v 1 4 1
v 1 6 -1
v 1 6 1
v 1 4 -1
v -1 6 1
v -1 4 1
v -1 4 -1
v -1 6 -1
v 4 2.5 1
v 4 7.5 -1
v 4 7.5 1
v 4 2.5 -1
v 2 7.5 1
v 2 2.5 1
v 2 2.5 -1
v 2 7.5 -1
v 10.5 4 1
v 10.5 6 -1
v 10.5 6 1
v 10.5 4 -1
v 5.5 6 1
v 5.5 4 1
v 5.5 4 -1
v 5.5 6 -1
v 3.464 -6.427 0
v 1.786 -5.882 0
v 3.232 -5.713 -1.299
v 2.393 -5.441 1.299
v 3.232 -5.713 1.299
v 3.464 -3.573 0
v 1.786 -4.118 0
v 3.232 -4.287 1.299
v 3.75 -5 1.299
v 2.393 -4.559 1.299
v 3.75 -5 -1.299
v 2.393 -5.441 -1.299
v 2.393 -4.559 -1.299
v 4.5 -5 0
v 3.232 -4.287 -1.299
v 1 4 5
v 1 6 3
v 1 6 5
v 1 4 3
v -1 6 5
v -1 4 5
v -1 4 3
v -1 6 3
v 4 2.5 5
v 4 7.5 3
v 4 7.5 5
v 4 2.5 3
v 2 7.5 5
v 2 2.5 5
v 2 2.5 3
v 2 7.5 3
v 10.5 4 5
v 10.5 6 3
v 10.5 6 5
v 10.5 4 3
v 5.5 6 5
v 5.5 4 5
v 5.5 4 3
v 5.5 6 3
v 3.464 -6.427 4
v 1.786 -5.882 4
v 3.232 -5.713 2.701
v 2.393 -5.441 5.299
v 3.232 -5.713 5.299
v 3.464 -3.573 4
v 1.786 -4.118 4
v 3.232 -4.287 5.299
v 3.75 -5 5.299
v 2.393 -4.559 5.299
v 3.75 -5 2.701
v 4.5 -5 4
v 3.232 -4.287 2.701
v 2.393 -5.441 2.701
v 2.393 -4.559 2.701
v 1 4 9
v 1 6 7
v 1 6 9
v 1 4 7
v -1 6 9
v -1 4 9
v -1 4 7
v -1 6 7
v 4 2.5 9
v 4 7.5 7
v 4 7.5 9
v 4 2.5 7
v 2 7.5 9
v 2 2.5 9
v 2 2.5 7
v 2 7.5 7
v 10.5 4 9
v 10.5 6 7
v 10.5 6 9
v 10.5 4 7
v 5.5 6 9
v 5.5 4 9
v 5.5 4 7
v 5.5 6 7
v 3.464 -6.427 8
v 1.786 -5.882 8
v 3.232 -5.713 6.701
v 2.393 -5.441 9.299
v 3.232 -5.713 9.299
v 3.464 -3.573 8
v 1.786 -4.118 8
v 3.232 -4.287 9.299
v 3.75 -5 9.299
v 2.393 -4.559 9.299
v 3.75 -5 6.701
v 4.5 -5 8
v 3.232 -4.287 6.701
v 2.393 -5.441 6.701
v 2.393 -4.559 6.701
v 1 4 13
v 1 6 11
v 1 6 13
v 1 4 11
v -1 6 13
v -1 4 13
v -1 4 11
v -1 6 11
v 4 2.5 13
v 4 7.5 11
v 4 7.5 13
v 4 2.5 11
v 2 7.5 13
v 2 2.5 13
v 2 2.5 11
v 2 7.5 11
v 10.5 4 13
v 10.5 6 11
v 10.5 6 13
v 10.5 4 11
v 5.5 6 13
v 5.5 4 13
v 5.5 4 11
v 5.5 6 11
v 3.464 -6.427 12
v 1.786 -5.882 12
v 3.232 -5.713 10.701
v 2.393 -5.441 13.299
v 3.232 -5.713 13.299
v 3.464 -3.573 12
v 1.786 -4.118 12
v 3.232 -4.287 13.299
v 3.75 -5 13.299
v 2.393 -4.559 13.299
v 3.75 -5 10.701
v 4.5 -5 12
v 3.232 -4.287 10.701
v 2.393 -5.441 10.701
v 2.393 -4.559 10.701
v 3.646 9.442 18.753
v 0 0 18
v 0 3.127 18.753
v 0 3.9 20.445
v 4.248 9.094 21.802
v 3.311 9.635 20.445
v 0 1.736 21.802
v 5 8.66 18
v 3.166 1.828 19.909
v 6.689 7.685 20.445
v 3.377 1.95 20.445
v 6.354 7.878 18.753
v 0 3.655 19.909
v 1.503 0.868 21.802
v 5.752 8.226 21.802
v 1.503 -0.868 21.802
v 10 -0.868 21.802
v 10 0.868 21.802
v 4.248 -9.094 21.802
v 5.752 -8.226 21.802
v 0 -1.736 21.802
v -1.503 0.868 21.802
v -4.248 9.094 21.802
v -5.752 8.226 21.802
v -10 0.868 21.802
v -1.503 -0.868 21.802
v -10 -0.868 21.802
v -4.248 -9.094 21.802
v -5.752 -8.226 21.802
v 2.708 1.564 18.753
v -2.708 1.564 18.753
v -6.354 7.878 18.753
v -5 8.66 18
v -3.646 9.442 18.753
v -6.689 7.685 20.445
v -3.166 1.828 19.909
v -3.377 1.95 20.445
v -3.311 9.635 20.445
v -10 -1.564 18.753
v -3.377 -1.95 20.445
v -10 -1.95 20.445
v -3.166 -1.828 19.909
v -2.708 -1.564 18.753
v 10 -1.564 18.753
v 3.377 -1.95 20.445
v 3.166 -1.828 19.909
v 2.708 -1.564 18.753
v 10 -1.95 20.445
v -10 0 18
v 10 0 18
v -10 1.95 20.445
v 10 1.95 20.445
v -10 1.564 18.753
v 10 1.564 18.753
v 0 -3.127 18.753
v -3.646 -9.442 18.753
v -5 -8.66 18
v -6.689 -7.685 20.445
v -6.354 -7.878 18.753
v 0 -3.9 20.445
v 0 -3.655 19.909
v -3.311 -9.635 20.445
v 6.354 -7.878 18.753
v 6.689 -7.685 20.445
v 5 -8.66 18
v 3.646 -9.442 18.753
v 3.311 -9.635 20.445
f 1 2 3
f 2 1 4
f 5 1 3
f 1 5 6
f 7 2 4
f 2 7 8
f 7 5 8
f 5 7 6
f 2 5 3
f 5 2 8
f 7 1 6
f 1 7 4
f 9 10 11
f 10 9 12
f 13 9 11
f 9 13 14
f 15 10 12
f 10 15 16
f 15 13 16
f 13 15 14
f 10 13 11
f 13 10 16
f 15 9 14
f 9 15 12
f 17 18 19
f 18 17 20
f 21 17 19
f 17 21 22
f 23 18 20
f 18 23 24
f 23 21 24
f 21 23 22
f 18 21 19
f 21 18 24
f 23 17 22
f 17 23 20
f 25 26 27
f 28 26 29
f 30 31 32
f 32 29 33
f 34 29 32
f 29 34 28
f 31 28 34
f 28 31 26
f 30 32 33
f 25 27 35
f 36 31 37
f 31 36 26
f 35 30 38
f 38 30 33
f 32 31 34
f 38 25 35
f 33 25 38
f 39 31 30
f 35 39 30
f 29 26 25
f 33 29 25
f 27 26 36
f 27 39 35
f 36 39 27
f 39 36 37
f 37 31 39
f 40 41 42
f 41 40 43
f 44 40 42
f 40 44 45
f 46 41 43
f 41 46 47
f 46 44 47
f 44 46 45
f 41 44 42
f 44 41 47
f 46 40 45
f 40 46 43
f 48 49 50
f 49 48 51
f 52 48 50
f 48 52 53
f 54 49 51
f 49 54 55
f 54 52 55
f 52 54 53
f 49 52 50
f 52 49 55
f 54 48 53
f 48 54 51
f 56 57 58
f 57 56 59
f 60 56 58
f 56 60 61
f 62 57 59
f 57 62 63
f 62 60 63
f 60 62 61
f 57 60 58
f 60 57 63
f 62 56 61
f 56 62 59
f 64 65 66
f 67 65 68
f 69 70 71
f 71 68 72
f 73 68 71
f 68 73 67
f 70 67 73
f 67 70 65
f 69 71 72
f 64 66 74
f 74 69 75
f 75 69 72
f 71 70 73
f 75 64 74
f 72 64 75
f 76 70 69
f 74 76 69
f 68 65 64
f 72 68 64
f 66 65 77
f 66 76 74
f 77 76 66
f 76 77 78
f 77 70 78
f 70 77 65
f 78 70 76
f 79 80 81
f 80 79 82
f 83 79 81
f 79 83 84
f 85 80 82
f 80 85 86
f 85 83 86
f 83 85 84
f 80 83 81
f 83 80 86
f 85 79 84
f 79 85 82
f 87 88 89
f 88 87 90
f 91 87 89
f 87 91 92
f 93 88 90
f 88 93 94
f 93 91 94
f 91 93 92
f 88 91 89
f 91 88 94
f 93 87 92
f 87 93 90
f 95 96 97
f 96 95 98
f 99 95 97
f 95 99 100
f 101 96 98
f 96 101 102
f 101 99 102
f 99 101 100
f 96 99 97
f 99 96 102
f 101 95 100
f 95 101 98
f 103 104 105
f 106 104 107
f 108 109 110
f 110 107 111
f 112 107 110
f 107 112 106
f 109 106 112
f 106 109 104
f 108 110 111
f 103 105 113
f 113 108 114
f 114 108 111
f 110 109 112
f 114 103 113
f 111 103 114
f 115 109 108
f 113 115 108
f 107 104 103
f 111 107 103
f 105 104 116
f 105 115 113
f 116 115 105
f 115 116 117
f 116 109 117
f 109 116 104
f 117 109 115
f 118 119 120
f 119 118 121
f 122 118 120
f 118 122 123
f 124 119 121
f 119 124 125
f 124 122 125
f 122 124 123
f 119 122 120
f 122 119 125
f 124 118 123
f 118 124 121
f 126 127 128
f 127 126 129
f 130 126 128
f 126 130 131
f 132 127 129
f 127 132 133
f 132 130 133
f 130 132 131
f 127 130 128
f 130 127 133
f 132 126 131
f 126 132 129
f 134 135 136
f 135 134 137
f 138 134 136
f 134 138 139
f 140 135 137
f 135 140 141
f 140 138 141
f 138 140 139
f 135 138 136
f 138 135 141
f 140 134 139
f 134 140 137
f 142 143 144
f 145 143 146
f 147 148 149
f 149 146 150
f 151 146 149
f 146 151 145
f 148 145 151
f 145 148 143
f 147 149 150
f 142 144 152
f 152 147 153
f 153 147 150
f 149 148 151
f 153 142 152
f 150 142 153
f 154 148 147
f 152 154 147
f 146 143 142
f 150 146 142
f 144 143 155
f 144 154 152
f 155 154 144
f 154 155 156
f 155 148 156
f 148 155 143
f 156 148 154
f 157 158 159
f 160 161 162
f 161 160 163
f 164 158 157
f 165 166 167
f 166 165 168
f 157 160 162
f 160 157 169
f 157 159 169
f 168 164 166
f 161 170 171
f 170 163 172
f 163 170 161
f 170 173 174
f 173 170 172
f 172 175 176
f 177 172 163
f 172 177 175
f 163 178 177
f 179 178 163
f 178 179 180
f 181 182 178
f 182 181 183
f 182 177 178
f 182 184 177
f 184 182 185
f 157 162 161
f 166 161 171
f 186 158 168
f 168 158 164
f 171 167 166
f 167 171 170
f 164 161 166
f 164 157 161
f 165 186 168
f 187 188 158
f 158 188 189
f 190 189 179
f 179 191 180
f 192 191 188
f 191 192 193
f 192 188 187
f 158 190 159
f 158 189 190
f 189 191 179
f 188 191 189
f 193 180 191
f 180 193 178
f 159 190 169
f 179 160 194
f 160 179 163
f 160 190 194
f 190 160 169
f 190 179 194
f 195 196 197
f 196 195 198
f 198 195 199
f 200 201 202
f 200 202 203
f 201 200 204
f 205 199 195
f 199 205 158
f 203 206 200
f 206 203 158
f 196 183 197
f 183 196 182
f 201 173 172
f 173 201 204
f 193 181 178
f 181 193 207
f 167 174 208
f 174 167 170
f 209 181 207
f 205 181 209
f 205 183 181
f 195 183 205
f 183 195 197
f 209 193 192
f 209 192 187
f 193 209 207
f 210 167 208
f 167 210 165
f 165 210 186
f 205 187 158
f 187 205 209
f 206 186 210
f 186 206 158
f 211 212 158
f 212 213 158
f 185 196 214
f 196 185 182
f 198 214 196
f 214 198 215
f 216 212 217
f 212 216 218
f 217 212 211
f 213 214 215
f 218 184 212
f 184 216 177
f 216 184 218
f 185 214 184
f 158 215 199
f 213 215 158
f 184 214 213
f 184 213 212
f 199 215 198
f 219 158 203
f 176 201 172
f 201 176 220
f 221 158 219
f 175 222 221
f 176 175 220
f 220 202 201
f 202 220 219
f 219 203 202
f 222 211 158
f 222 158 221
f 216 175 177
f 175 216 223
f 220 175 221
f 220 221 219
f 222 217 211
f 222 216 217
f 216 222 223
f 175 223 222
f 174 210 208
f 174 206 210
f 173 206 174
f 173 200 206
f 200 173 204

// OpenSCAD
/*

Sage Ridge Robotics OpenSCAD file.
Christopher von Nagy, July 2014.

Example 04 sets. 

*/


// Creating sets of objects
// You'll recognize the for() loop from Processing, though
// its syntax is a bit different. The loop is used to 
// create sets of objects. Here, [0 : 4 : 12] means start at zero 
// and count by 4s to 12. [0 : 12] would mean count by ones, and
// [0 : 0.5 : 12] would mean count by halves.

for (i = [0 : 4 : 12]) 
{

   translate([0,5,i]) cube(size = 2, center = true);
   translate([3,5,i]) cube([2,5,2], center = true);
   translate([8,5,i]) cube([5,2,2], center = true);
   translate([3,-5,i]) sphere(d = 3, center = true);

}

// rotate() allows you to spin objects around
// rotation takes three variables: degrees of rotation
// about the x axis, y axis, and z axis. 

// Which direction do objects rotate? Clockwise? Counter clockwise?

for(i = [1 : 6])
{
   translate([0,0,20])
   rotate([0,90,60 * i]) 
   cylinder(r=2,h=10,center = false);
}

/*

License code:

Creative Commons Atribution 4.0

Attribution — You must give appropriate credit, provide a link to the license, and indicate if changes were made. You may do so in any reasonable manner, but not in any way that suggests the licensor endorses you or your use.

No additional restrictions — You may not apply legal terms or technological measures that legally restrict others from doing anything the license permits.


*/
